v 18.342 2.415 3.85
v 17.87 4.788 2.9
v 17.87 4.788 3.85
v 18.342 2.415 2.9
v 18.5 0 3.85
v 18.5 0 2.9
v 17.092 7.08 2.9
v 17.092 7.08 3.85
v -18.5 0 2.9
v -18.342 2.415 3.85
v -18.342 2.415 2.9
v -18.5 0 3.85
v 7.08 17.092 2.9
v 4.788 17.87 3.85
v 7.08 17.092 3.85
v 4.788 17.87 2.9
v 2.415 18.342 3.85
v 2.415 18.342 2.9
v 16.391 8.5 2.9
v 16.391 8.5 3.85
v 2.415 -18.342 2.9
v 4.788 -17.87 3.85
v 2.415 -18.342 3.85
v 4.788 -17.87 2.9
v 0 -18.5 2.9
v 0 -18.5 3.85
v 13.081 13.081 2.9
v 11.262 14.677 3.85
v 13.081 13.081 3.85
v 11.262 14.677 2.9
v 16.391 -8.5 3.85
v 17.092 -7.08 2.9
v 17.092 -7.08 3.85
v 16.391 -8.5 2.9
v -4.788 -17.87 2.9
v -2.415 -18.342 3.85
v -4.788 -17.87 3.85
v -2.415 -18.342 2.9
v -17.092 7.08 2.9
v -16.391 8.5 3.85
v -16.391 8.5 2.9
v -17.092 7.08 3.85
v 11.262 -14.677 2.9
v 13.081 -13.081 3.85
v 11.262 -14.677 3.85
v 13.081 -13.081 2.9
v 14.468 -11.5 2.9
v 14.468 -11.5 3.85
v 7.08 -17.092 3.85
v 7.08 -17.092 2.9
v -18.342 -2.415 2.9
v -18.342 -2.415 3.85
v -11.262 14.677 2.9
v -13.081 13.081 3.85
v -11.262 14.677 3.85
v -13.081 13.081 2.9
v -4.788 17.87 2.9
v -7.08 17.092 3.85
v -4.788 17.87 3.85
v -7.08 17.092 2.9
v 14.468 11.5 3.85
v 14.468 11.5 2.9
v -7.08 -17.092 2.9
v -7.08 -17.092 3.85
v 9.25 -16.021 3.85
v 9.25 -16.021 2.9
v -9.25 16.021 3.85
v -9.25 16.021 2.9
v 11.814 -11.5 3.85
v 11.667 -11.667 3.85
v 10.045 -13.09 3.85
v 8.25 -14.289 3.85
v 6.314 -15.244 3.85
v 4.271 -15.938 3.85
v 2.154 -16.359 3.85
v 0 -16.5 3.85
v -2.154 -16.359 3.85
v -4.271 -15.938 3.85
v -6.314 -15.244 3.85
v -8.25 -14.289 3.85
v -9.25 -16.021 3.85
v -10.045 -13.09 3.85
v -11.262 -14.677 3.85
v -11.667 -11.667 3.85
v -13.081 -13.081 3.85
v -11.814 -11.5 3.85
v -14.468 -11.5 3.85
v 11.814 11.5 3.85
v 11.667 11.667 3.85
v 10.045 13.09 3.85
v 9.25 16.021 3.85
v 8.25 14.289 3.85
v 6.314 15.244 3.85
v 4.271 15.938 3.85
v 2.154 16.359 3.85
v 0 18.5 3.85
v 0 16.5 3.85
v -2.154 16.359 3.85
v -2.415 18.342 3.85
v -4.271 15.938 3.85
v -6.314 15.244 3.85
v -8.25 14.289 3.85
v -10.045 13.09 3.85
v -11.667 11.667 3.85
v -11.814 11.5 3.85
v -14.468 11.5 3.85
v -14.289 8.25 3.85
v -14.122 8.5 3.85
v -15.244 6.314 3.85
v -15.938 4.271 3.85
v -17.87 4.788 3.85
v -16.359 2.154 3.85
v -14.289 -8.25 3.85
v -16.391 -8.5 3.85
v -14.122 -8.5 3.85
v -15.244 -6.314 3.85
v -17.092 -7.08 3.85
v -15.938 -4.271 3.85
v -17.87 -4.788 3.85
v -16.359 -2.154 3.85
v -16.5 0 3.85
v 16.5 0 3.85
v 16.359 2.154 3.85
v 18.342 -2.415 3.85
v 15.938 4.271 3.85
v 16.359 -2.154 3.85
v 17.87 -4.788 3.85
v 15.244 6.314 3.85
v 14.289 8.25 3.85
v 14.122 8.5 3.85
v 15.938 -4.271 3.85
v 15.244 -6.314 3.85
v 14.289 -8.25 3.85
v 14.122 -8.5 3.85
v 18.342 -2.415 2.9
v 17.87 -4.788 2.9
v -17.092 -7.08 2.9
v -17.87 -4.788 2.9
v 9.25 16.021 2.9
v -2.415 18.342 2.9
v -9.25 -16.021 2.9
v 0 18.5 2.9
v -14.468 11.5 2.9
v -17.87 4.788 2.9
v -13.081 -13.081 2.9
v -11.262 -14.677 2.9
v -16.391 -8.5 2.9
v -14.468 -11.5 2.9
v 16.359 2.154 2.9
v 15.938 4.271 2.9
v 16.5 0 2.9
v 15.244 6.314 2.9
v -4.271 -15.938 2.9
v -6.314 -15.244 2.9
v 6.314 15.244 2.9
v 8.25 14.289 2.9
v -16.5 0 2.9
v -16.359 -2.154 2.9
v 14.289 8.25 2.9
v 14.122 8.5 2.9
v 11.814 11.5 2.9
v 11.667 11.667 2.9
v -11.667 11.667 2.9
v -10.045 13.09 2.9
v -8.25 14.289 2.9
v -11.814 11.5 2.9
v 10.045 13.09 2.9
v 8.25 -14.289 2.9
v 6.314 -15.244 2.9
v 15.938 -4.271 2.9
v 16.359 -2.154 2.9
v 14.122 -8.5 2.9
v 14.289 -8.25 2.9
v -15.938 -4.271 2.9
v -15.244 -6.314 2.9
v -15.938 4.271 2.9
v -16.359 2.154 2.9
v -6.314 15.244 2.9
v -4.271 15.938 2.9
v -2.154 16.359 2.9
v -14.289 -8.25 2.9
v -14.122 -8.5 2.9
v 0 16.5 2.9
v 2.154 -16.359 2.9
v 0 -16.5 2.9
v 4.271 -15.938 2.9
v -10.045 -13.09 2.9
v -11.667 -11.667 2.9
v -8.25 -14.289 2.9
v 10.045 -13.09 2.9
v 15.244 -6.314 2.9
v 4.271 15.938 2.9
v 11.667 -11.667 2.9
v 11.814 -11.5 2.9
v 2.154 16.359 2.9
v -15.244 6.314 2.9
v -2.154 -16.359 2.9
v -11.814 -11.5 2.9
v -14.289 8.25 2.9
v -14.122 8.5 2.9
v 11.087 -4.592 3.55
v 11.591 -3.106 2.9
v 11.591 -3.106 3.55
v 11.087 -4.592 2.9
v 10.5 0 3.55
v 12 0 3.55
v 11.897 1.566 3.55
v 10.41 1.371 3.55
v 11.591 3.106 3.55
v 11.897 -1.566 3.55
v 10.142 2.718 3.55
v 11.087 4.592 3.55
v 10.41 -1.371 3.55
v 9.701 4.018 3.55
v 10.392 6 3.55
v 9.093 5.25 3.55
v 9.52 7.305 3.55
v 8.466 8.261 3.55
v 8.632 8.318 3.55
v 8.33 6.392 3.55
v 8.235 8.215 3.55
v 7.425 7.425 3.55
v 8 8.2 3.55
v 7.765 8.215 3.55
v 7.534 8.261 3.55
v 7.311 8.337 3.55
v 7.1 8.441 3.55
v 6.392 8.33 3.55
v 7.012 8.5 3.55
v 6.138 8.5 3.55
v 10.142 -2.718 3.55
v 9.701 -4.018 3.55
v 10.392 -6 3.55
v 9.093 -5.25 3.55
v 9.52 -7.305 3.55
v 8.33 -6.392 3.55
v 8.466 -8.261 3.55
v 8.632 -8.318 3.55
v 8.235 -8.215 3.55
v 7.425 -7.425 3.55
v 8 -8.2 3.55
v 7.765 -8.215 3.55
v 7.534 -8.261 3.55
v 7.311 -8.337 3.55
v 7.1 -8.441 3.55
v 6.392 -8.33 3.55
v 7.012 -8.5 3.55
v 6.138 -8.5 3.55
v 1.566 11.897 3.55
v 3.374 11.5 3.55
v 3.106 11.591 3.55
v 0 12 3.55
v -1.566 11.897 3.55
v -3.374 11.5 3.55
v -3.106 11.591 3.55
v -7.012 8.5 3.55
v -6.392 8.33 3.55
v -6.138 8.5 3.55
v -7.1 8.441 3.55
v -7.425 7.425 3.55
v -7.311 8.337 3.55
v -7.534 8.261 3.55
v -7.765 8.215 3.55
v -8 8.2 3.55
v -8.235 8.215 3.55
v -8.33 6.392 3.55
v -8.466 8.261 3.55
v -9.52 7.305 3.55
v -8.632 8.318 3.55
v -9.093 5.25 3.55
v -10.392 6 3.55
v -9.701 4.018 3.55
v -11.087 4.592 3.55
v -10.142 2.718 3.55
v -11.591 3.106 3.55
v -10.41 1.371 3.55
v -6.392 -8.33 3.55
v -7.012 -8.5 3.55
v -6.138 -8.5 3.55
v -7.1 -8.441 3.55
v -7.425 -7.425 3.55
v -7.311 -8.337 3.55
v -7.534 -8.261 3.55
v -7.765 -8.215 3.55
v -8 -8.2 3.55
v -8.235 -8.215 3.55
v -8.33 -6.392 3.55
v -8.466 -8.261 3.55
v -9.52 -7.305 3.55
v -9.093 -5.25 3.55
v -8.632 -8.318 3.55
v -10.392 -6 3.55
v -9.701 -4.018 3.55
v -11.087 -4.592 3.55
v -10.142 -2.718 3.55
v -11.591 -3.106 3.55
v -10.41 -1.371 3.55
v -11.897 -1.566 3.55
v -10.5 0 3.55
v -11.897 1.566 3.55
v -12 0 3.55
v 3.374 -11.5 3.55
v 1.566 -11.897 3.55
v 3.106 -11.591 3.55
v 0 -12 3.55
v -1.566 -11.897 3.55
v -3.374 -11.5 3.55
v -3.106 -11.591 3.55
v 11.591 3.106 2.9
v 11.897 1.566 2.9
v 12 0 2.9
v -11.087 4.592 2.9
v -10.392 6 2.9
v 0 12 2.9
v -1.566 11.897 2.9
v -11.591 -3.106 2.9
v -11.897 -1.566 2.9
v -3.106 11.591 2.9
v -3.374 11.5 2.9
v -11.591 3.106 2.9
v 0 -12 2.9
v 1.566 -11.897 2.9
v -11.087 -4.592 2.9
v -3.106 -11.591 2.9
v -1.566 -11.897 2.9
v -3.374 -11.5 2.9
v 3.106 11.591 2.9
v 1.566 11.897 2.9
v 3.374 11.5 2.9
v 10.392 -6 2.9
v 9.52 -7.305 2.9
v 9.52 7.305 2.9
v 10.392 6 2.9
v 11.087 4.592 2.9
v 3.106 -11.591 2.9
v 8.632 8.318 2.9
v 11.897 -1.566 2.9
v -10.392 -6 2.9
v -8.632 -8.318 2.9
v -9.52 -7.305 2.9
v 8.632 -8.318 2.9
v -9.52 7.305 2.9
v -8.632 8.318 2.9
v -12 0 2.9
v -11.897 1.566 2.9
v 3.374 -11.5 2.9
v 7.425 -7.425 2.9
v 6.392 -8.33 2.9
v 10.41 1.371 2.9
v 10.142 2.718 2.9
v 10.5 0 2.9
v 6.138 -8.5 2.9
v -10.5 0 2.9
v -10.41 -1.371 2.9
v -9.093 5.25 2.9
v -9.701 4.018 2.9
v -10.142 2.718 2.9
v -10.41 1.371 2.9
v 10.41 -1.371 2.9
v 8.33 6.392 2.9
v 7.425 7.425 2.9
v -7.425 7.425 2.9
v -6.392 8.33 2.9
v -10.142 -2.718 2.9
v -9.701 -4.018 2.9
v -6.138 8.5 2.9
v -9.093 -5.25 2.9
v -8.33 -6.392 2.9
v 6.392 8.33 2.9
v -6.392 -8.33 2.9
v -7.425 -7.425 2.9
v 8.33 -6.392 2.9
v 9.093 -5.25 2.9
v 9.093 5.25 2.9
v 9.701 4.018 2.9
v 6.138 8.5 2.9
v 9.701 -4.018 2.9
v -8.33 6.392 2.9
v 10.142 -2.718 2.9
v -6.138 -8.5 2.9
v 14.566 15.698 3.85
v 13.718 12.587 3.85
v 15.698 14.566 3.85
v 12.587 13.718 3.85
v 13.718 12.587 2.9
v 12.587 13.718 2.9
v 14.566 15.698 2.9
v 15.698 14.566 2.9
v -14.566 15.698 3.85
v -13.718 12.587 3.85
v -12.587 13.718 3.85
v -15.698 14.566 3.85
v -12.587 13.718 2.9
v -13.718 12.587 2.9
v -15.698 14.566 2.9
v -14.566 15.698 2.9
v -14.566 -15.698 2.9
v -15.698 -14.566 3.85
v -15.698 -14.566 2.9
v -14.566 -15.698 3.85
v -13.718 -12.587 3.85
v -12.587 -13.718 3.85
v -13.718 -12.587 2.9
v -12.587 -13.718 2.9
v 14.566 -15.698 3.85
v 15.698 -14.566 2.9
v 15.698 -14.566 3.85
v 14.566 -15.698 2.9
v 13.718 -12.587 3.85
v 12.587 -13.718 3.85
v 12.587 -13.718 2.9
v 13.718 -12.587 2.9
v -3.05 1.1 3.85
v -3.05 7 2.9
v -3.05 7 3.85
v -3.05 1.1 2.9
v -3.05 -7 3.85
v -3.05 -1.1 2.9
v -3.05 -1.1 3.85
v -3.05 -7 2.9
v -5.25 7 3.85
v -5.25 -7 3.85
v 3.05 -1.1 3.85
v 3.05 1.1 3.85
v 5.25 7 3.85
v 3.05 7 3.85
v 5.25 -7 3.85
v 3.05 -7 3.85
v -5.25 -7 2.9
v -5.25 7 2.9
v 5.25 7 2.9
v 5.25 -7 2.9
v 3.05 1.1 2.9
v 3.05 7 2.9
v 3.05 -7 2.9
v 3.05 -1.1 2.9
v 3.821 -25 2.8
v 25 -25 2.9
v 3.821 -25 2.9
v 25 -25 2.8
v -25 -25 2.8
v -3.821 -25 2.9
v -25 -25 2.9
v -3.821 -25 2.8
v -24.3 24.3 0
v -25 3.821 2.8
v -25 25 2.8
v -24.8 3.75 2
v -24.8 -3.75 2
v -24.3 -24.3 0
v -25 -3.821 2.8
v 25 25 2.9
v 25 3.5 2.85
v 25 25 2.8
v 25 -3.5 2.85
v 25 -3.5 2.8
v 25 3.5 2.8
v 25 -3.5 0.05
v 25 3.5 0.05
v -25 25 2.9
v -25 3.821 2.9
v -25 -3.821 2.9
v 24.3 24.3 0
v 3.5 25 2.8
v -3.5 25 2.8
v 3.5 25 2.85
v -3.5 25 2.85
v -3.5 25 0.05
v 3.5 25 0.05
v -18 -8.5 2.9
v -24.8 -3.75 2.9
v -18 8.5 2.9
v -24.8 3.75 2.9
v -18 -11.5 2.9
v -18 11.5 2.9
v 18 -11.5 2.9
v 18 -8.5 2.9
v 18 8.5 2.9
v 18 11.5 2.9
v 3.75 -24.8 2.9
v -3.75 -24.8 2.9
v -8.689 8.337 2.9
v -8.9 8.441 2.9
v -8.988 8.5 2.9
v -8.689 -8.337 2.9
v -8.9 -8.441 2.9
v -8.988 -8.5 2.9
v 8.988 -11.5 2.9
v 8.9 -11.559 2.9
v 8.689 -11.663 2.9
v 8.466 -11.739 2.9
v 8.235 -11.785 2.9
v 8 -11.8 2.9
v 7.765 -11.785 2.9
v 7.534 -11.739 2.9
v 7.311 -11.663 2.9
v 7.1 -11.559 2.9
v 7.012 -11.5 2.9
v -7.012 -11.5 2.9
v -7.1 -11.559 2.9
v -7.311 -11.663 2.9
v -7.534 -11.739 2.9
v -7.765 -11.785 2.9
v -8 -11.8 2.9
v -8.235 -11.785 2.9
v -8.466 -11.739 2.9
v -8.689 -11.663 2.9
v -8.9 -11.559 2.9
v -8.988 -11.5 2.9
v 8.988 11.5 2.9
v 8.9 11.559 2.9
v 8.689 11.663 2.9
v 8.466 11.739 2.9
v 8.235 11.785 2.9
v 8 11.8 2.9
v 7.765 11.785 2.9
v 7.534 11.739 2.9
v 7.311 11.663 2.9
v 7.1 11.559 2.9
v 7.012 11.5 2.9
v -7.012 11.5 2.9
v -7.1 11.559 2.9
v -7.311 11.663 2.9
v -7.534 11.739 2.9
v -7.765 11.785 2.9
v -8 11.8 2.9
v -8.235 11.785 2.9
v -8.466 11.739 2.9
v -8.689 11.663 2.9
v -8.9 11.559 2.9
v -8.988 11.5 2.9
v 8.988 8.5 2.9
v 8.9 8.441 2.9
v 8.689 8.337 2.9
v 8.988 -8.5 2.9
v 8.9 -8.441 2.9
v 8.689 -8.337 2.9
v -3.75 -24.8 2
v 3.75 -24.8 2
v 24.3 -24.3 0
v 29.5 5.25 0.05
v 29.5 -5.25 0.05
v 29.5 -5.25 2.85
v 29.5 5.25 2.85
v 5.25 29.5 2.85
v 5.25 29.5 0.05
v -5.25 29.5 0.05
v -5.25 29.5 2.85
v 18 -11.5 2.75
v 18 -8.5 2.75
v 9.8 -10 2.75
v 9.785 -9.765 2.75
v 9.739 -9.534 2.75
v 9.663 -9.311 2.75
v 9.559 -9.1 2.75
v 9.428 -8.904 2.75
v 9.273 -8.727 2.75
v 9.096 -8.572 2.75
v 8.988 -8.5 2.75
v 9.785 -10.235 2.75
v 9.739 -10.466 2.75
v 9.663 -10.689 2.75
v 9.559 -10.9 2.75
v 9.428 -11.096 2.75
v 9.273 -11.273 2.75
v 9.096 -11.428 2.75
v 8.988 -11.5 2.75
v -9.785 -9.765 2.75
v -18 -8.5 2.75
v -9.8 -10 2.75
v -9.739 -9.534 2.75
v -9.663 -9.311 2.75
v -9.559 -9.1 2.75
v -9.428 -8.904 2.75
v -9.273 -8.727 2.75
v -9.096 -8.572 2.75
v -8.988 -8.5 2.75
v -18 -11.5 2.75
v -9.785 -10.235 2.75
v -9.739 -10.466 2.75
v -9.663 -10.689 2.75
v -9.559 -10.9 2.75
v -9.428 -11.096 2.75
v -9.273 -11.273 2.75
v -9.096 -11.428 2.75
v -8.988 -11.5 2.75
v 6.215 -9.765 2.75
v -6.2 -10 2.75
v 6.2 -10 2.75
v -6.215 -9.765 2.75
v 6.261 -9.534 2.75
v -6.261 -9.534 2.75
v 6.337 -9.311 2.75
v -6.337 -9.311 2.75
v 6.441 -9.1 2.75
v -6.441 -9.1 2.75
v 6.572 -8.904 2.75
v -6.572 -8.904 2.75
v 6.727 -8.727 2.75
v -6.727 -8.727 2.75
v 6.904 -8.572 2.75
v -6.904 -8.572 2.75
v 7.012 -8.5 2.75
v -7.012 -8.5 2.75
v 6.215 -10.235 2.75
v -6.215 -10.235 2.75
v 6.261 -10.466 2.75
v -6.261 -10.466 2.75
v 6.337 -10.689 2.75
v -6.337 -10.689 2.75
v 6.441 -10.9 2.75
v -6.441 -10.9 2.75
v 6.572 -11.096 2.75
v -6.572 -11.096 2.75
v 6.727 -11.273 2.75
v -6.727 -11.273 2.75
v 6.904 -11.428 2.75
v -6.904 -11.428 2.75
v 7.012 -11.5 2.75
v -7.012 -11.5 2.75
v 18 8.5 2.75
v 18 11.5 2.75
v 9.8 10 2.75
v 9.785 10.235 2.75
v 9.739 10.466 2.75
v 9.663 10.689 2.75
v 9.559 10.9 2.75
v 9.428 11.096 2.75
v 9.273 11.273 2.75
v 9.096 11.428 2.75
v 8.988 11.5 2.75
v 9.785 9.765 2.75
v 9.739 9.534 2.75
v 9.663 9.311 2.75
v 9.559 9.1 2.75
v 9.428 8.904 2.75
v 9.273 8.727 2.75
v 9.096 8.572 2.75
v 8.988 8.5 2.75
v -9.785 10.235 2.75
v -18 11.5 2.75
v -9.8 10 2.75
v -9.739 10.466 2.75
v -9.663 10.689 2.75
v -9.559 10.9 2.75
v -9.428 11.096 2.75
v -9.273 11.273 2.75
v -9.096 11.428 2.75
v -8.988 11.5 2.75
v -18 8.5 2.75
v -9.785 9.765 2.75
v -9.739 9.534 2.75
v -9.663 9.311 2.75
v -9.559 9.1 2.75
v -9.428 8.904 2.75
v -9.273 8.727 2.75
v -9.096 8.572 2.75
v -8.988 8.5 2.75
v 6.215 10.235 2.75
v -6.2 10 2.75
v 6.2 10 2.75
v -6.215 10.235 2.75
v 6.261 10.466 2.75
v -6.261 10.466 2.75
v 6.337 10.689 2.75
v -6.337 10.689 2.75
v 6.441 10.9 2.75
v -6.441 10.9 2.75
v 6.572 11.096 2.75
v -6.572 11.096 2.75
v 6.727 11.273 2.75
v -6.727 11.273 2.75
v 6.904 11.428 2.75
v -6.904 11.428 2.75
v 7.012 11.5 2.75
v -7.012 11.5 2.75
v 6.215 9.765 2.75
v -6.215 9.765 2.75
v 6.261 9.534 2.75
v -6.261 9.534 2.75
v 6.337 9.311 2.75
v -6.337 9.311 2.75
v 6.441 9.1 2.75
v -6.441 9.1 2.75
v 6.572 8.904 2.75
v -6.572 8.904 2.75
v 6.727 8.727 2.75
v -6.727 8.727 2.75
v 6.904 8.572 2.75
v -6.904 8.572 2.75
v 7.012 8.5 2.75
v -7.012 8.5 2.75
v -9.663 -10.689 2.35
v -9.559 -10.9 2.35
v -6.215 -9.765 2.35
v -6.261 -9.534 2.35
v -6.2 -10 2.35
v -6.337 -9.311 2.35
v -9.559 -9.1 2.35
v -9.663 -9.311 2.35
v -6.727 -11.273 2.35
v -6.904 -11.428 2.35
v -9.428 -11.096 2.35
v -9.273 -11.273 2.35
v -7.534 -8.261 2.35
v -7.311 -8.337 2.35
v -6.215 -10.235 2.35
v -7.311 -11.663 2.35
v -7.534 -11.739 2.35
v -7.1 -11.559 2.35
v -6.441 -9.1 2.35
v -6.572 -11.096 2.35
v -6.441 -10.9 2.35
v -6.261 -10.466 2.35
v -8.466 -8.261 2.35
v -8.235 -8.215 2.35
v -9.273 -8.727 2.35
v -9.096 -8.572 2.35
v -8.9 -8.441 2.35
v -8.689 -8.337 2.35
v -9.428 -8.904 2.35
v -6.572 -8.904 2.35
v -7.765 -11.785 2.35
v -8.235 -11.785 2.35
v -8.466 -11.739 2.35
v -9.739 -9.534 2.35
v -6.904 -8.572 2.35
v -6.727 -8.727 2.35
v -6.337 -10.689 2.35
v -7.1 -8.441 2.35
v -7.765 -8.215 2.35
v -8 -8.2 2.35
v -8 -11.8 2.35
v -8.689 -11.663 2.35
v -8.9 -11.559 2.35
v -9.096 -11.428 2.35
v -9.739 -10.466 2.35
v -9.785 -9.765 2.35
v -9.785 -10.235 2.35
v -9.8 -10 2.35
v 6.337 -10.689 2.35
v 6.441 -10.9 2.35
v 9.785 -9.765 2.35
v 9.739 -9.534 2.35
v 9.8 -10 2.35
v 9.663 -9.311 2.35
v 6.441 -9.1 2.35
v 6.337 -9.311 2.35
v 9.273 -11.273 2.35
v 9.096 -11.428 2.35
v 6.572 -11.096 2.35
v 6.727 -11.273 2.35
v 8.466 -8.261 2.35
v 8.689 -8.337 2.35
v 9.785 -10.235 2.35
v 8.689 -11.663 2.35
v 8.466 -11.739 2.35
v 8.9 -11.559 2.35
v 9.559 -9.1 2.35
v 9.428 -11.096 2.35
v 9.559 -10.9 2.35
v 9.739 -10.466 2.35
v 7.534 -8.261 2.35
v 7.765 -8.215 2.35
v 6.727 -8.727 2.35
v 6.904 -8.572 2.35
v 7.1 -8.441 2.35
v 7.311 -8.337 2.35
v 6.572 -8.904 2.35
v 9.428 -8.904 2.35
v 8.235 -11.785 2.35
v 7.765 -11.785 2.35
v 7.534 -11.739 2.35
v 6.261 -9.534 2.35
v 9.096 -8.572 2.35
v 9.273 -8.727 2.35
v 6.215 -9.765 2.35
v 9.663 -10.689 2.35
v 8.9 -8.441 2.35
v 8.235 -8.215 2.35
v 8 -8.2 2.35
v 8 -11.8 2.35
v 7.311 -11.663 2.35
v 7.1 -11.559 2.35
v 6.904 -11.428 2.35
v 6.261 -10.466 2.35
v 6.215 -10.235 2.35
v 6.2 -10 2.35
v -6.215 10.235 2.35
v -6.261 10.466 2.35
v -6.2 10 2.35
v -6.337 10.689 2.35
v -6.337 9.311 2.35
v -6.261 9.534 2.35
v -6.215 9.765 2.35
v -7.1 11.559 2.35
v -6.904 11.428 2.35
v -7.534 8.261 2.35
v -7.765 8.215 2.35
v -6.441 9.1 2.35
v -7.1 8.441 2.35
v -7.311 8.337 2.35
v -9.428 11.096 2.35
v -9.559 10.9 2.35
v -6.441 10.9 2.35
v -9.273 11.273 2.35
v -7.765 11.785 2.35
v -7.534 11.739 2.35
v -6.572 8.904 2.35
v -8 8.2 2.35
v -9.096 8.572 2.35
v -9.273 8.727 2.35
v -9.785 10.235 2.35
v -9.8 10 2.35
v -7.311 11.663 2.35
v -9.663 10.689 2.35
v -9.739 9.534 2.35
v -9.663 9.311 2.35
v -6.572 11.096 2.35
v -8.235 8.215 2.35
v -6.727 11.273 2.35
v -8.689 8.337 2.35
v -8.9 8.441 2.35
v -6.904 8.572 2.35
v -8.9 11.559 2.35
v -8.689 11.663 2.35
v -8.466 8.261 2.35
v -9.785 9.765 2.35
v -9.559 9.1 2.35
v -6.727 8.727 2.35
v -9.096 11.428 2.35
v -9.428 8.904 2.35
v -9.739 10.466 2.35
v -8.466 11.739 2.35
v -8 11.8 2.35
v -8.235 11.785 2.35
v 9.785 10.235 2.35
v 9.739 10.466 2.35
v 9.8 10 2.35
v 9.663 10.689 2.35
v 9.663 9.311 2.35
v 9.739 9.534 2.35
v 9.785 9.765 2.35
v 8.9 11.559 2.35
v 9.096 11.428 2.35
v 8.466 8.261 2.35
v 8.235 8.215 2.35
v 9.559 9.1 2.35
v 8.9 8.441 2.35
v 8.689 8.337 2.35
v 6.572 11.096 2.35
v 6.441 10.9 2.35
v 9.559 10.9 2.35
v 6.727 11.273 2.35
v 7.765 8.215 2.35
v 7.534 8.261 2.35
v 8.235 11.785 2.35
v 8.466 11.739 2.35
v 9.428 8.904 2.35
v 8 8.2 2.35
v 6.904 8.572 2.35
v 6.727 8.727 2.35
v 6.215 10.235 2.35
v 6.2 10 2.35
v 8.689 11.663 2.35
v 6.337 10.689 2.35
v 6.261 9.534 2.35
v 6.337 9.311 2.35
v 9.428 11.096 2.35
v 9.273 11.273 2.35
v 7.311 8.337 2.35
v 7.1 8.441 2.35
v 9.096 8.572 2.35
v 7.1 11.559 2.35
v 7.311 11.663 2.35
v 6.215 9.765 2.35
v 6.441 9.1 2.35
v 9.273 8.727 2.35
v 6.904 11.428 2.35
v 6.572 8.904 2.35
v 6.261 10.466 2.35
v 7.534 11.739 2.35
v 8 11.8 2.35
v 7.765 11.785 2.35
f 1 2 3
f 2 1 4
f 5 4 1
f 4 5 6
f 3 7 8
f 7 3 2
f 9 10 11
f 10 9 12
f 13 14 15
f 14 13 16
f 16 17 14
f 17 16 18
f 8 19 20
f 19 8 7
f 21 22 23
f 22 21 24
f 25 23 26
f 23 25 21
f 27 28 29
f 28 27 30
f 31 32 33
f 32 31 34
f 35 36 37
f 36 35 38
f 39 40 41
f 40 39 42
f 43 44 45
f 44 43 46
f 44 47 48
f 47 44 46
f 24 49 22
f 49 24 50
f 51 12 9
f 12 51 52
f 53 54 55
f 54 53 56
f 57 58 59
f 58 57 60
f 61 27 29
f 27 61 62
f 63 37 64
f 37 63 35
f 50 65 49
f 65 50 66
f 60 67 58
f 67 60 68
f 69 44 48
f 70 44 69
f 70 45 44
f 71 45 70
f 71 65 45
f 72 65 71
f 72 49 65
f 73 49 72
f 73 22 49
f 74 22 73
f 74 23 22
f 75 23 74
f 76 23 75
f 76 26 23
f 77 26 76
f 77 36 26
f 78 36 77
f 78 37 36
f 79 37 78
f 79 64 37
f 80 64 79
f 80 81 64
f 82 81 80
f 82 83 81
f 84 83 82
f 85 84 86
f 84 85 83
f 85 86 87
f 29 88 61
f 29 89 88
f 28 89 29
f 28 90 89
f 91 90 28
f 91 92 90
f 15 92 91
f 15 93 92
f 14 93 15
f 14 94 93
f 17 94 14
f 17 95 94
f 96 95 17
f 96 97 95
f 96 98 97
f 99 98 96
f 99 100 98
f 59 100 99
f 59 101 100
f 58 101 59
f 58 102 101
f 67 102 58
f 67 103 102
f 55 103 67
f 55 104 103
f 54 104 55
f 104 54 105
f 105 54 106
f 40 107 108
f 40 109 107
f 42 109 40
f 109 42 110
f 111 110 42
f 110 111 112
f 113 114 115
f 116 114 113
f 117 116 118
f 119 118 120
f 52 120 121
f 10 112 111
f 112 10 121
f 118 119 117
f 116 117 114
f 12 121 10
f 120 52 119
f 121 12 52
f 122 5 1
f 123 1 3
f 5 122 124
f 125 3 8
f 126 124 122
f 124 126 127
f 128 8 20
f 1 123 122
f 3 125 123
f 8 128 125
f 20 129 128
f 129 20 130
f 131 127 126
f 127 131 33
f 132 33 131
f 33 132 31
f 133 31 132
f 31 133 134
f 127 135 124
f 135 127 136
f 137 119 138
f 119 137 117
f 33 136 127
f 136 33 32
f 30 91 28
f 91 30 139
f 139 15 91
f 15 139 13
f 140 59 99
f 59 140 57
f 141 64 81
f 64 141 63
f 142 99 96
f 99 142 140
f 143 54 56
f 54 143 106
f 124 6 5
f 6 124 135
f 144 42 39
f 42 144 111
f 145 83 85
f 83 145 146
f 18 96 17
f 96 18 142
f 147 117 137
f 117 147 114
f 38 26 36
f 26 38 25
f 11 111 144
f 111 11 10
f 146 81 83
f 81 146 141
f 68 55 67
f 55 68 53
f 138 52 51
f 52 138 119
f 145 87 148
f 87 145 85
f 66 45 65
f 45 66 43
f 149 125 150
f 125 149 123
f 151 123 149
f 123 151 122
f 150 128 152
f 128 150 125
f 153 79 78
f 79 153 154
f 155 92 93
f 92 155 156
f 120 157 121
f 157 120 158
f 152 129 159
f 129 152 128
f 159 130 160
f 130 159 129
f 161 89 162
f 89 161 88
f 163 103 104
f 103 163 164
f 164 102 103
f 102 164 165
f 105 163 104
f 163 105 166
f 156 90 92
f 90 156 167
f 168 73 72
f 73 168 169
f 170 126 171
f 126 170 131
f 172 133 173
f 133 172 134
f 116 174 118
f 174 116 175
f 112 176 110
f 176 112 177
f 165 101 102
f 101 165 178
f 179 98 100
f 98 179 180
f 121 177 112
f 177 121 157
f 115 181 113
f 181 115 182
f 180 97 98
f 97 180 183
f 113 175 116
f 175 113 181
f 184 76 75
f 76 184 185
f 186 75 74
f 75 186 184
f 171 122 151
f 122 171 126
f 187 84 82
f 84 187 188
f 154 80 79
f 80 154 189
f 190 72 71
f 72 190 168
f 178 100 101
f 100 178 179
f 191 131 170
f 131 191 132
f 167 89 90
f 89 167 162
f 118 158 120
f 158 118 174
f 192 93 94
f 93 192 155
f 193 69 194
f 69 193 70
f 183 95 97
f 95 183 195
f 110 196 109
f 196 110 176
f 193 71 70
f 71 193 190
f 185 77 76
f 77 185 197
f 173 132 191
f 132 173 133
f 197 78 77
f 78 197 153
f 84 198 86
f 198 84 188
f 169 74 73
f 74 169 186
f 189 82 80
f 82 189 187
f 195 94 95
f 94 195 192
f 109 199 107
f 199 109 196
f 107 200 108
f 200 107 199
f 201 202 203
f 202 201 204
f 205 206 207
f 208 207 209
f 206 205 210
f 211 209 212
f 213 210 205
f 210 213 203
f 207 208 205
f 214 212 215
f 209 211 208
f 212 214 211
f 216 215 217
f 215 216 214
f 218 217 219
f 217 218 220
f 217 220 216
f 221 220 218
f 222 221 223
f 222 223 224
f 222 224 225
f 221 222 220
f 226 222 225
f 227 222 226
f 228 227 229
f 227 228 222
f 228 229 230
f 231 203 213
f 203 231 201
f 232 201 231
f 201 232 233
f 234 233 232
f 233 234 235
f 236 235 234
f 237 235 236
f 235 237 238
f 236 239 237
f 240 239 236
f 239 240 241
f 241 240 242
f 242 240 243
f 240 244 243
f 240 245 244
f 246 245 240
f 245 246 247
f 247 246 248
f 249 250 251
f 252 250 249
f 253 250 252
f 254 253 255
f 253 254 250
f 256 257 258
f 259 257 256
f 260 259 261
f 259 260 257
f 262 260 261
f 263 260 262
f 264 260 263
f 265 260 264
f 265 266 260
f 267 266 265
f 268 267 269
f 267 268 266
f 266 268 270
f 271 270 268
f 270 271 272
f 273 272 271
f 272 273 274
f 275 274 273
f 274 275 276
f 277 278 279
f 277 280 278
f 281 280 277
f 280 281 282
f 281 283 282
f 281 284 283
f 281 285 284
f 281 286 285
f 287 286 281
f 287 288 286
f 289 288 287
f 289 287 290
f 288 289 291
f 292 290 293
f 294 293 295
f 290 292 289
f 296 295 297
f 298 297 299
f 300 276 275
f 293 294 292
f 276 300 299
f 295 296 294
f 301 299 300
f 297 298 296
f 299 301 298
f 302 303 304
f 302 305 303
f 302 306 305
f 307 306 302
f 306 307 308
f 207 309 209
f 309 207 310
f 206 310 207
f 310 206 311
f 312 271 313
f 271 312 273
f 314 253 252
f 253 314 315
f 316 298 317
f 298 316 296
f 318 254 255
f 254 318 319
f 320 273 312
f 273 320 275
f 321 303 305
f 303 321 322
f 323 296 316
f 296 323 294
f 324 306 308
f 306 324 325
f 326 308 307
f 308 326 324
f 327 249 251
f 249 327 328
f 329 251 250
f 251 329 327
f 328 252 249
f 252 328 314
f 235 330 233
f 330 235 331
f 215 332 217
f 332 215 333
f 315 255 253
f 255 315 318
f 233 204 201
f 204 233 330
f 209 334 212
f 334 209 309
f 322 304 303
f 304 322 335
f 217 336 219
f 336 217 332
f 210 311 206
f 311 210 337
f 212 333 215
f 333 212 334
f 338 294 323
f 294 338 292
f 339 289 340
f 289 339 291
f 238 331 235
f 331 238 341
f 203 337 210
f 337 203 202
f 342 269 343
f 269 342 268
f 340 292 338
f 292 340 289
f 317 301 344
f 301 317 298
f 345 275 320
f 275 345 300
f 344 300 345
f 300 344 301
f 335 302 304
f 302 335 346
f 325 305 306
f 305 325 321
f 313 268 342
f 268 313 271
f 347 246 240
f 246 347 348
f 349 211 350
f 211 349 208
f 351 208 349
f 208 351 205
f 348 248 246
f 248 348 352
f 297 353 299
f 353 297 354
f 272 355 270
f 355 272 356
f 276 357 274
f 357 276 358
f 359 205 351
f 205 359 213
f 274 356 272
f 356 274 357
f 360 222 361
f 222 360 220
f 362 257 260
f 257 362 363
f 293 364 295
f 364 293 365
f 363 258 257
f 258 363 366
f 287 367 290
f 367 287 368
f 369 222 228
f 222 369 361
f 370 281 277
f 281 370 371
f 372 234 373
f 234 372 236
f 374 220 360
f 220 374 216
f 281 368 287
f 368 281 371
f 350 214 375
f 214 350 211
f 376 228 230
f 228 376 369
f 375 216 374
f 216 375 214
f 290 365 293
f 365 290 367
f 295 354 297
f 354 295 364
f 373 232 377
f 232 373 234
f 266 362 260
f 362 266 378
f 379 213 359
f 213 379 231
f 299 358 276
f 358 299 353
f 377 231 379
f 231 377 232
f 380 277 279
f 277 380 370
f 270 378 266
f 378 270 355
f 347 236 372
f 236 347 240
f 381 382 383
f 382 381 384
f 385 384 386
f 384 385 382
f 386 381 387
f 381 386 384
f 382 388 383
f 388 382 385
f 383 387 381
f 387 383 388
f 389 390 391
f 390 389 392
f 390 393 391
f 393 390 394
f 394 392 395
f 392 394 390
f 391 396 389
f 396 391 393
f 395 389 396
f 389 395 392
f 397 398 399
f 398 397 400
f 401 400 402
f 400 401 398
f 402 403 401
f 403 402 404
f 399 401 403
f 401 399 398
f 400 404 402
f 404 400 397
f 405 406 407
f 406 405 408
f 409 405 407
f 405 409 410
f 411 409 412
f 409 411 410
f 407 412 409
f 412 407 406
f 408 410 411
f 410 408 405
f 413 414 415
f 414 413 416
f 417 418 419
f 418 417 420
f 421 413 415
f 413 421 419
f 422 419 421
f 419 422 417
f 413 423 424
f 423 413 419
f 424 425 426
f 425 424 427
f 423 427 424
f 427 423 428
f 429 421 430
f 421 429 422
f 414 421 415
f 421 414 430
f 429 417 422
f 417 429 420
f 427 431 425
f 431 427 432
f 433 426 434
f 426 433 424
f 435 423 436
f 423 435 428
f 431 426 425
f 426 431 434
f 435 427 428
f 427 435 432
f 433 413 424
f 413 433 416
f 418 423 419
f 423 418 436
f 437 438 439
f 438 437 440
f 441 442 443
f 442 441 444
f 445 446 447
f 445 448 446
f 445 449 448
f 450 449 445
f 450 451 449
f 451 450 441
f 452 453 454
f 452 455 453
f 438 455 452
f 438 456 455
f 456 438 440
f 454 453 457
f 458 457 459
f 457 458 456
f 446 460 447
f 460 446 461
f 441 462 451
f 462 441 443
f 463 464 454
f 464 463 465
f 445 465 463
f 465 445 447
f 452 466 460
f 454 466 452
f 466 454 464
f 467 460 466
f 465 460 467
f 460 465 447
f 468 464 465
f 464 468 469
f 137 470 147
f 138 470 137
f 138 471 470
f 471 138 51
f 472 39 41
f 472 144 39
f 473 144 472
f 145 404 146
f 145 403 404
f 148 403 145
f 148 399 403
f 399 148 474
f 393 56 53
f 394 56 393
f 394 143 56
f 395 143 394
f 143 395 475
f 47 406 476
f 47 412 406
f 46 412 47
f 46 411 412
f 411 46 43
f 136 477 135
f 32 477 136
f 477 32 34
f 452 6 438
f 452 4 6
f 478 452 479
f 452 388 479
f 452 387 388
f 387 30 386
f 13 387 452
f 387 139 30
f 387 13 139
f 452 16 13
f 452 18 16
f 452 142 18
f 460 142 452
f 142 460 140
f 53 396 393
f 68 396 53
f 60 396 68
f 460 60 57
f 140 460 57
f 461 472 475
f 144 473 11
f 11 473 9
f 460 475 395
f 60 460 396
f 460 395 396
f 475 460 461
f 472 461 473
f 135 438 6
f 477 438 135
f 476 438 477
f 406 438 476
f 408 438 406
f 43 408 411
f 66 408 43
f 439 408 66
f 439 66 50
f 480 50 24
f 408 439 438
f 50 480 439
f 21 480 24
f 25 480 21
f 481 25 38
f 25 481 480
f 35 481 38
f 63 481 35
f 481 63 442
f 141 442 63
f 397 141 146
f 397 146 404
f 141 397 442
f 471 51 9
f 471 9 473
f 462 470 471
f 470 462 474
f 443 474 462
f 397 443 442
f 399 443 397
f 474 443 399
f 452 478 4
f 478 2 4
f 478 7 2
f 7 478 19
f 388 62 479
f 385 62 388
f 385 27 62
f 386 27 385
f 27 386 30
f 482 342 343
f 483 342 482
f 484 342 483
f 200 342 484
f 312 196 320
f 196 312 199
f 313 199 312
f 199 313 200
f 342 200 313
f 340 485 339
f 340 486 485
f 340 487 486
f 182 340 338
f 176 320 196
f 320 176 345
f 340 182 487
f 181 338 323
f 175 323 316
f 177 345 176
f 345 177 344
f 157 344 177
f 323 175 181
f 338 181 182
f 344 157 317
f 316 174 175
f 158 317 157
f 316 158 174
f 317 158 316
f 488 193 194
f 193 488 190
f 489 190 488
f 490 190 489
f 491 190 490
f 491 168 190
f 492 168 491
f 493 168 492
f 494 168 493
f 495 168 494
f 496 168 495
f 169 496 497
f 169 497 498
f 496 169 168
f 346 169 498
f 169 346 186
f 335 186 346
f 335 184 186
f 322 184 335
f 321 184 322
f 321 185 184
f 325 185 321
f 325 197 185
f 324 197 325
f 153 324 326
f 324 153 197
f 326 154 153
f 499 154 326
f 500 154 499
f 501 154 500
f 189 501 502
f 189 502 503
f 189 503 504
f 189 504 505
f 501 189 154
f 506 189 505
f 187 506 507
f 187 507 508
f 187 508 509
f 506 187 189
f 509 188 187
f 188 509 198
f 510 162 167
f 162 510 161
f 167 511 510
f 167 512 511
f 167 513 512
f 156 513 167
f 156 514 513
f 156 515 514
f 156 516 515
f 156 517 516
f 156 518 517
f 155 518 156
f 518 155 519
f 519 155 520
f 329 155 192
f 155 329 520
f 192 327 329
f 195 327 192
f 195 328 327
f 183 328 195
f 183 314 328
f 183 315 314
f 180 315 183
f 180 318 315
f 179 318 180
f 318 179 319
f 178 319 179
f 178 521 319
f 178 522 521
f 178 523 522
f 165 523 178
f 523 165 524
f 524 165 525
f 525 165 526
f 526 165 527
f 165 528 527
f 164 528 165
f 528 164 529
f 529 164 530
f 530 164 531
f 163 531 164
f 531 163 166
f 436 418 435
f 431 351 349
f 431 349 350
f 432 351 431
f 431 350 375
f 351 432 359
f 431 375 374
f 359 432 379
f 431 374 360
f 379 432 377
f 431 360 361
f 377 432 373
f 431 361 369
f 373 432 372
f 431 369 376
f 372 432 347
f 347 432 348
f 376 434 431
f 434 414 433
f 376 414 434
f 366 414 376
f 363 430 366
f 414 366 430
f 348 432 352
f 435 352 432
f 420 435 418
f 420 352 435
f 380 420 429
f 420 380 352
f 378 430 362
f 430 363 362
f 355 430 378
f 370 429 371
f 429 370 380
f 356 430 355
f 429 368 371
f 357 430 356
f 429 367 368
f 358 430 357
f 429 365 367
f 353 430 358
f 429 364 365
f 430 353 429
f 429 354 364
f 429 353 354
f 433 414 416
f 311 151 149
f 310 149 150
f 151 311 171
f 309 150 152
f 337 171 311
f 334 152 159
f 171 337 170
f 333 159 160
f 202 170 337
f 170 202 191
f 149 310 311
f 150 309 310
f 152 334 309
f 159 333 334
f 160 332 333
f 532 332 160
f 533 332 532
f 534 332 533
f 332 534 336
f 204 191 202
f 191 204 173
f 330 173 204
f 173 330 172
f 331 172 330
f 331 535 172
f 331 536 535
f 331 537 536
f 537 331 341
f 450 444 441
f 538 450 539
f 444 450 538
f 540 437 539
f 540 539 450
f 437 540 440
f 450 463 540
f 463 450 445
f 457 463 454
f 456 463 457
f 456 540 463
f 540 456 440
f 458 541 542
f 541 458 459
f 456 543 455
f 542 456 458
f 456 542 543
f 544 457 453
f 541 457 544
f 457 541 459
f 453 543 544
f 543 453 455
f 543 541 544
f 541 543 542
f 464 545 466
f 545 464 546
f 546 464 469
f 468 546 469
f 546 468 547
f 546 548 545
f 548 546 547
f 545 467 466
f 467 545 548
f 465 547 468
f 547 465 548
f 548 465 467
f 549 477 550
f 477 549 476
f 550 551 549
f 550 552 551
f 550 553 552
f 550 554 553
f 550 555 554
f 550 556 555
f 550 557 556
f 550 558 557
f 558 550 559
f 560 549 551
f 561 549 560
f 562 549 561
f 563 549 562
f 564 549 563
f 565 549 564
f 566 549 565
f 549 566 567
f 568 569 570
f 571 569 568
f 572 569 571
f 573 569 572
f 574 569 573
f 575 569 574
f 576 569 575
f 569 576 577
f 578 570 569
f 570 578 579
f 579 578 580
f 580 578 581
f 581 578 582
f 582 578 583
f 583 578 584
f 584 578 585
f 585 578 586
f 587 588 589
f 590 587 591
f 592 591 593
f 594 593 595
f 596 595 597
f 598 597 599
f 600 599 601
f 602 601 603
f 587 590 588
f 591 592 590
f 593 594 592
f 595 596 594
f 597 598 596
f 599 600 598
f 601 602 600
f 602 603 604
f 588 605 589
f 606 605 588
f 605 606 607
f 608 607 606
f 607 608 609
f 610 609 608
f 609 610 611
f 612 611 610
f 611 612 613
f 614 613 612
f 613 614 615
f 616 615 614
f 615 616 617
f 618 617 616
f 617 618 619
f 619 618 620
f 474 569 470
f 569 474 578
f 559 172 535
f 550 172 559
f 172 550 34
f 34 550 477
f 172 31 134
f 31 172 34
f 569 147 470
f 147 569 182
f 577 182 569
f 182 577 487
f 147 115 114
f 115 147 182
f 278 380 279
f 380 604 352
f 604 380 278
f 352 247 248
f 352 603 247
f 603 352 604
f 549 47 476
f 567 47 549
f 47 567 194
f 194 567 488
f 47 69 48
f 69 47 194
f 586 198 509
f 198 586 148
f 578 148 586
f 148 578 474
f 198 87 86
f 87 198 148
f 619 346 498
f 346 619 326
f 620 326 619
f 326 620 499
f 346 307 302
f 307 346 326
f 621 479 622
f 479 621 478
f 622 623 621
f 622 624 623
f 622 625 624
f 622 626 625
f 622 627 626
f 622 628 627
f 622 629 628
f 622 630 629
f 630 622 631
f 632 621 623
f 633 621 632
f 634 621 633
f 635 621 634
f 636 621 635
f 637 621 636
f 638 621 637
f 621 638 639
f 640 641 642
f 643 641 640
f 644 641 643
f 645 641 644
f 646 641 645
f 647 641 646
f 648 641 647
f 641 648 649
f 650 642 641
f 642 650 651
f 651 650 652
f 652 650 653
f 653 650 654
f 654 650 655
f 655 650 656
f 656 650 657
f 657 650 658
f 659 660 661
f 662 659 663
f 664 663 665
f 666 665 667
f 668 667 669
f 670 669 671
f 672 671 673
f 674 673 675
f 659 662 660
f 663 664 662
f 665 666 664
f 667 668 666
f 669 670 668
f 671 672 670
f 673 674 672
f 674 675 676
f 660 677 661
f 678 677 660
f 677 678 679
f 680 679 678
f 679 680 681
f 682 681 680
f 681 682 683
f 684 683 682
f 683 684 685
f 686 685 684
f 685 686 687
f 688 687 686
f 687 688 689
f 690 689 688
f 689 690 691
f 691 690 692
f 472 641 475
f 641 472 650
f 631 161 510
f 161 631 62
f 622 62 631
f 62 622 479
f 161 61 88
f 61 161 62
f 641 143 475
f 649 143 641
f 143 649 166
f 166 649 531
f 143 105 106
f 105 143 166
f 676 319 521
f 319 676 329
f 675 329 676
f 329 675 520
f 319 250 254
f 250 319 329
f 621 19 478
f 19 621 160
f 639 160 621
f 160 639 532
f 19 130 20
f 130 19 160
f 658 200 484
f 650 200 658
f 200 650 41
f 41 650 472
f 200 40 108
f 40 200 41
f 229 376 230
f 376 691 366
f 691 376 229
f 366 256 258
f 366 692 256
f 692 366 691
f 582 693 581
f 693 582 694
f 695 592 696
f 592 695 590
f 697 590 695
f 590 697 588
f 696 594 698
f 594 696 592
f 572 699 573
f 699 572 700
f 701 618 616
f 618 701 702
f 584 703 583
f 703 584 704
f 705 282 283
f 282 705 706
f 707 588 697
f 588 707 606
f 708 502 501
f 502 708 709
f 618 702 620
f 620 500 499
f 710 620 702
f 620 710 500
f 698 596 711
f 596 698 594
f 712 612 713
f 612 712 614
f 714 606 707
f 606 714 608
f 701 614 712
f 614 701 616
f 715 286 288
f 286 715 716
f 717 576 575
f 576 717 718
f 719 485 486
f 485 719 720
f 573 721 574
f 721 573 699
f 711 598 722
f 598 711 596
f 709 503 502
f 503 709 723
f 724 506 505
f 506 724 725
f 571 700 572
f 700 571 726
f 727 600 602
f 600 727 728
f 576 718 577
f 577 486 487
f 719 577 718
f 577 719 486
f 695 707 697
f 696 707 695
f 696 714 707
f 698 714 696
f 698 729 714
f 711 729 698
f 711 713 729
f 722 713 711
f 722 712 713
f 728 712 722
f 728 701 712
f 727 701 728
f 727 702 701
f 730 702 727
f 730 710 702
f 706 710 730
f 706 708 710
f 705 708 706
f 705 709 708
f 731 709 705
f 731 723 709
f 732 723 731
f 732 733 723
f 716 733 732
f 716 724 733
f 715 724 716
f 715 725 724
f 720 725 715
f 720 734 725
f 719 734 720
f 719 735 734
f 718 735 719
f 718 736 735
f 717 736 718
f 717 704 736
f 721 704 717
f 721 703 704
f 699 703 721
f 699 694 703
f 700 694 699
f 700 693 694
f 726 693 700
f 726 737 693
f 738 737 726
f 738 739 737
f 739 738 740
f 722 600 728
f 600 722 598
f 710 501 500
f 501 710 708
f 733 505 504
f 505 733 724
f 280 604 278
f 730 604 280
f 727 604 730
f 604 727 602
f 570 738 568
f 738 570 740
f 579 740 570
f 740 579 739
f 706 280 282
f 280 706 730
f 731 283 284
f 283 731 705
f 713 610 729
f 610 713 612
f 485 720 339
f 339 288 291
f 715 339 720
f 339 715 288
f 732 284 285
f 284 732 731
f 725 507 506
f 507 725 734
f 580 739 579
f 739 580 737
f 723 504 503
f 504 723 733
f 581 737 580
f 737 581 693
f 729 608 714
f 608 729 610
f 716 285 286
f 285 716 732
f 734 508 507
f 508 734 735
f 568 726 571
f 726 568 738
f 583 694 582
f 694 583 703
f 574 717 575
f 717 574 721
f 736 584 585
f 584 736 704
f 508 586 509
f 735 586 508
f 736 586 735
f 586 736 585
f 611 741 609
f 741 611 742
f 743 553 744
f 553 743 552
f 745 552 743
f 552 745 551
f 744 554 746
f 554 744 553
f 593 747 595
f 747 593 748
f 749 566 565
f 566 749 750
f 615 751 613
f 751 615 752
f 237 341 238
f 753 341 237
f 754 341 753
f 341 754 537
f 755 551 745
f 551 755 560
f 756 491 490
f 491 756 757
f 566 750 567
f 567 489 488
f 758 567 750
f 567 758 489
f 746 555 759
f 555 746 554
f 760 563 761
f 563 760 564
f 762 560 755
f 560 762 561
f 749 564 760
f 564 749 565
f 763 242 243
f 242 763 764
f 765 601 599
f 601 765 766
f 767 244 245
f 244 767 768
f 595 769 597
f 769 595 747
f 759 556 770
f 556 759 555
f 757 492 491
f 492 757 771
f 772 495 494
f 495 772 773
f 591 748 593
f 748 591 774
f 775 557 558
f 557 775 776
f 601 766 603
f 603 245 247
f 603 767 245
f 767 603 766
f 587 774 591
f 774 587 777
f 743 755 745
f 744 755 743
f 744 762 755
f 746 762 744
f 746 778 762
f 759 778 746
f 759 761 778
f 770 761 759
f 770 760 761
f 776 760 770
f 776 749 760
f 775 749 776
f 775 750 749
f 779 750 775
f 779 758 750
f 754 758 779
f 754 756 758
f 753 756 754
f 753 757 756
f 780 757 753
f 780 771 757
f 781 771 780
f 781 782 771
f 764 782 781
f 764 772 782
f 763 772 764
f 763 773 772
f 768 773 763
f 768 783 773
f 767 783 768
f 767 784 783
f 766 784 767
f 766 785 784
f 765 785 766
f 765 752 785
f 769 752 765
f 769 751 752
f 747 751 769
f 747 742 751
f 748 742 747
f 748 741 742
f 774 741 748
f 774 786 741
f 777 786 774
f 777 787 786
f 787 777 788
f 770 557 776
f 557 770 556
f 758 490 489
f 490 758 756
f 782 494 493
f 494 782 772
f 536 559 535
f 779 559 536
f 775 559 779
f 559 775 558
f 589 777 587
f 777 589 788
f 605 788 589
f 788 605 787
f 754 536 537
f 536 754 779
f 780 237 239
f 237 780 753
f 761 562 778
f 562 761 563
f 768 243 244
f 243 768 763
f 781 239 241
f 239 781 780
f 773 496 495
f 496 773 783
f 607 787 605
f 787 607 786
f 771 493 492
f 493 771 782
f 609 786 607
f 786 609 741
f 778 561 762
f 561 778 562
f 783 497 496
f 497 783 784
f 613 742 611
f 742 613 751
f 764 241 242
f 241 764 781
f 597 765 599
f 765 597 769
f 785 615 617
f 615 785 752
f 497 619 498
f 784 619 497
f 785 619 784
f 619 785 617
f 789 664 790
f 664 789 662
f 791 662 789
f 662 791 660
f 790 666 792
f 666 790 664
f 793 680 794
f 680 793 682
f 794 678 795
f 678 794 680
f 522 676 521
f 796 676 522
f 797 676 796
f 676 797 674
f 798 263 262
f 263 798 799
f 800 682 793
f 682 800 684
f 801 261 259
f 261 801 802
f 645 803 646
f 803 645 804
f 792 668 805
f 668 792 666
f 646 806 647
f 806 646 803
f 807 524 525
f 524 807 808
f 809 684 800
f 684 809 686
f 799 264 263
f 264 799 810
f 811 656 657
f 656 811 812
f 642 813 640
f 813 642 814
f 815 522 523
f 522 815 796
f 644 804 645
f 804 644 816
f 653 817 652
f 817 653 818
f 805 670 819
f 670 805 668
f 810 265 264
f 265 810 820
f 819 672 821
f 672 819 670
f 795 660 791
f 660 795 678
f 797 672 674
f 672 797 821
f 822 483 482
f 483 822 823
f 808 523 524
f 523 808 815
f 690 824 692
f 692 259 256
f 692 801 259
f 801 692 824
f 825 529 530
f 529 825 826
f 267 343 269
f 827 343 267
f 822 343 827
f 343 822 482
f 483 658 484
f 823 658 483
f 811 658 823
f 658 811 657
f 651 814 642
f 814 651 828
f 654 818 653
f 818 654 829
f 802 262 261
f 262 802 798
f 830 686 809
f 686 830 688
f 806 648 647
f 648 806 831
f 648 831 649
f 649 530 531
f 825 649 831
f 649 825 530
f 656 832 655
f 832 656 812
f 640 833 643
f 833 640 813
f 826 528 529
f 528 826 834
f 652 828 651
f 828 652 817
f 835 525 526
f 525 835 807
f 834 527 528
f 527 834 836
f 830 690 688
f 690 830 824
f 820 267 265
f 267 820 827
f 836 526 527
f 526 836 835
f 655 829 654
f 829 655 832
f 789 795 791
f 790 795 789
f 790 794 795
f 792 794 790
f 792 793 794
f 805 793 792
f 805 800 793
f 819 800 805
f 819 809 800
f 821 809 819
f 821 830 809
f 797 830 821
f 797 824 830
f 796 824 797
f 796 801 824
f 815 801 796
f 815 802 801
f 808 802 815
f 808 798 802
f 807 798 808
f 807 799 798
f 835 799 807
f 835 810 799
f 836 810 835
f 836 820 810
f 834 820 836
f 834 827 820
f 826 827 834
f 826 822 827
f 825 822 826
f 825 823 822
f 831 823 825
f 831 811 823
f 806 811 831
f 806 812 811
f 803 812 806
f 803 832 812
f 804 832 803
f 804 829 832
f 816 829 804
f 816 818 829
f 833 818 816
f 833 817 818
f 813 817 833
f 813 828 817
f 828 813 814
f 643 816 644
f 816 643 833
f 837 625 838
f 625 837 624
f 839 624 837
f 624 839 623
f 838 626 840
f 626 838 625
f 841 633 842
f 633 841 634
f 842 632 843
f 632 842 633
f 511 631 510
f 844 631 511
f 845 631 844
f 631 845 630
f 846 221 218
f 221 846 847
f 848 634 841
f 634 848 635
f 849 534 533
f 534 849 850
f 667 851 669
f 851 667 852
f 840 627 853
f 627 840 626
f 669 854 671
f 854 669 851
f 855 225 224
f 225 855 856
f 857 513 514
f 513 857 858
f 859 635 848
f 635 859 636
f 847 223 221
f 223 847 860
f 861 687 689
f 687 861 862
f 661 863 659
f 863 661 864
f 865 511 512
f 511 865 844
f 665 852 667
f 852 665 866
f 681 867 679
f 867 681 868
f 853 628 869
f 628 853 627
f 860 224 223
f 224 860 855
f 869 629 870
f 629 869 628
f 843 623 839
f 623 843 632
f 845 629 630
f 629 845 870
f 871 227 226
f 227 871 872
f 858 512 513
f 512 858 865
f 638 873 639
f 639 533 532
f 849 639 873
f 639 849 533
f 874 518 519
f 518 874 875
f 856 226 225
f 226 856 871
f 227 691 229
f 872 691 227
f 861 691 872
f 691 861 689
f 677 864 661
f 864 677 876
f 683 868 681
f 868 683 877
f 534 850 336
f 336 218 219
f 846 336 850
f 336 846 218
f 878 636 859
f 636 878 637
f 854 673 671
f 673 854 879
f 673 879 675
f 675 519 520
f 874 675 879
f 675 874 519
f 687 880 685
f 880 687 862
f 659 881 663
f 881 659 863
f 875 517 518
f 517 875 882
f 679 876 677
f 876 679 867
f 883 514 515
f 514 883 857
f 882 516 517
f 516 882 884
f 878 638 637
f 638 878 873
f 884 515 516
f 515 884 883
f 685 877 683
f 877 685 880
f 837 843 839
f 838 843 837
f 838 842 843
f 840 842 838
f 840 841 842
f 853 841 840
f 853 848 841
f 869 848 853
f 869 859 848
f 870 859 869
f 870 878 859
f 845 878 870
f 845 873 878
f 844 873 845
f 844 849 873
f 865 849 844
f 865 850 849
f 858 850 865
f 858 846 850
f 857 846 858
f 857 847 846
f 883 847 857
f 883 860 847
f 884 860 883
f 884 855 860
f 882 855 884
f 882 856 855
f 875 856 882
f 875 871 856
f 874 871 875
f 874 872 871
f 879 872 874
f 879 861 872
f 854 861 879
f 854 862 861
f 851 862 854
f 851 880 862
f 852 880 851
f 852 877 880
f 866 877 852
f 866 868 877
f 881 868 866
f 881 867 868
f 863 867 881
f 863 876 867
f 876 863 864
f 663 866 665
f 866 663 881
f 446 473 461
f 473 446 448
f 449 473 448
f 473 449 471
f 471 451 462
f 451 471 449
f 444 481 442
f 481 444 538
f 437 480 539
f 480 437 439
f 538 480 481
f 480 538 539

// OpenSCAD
// file: 05_modular_35mm_helipad_base.scad
// ====================================================================
// Modular Helipad Base - 5.0 cm (50mm) Square Interlocking Tile
// Dimensions: 50.0 mm x 50.0 mm x 3.8 mm
// Standard tile footprint designed for 5.0 cm Modular Chopper.
//
// Features:
// - Standard 50mm (5.0 cm) modular grid footprint
// - Male / Female dovetail connectors on orthogonal sides (0.25mm clearance)
// - Precision skid landing alignment slots (20.0mm track for 5cm chopper skids)
// - Helipad 'H' and concentric marking rings
// - 45-degree chamfered perimeter to prevent corner warping
// ====================================================================

$fn = 48;

tile_size = 50.0;
base_h    = 2.8;
relief_h  = 1.0;
total_h   = base_h + relief_h;
skid_span = 20.0; // Distance between skid centers (matches 5cm chopper)

// Dovetail parameters
dt_w_base = 7.0;
dt_w_tip  = 10.5;
dt_depth  = 4.5;
dt_tol    = 0.25; // Radial tolerance for snap fit

module dovetail_male() {
    linear_extrude(height = base_h)
        polygon([
            [-dt_w_base/2, 0],
            [ dt_w_base/2, 0],
            [ dt_w_tip/2,  dt_depth],
            [-dt_w_tip/2,  dt_depth]
        ]);
}

module dovetail_female() {
    w_b = dt_w_base/2 + dt_tol;
    w_t = dt_w_tip/2 + dt_tol;
    d   = dt_depth + dt_tol;
    translate([0, 0, -0.1])
        linear_extrude(height = base_h + 0.2)
            polygon([
                [-w_b, -0.2],
                [ w_b, -0.2],
                [ w_t,  d],
                [-w_t,  d]
            ]);
}

module helipad_markings() {
    // Concentric outer ring
    difference() {
        cylinder(r = 18.5, h = relief_h, center = false);
        translate([0, 0, -0.1])
            cylinder(r = 16.5, h = relief_h + 0.2, center = false);
    }

    // Inner dashed accent ring
    difference() {
        cylinder(r = 12.0, h = relief_h * 0.7, center = false);
        translate([0, 0, -0.1])
            cylinder(r = 10.5, h = relief_h + 0.2, center = false);
    }

    // Classic Helipad 'H' symbol
    h_h = 14.0;
    h_w = 10.5;
    h_t = 2.2;
    // Left vertical bar
    translate([-h_w/2 + h_t/2, 0, relief_h/2])
        cube([h_t, h_h, relief_h], center = true);
    // Right vertical bar
    translate([h_w/2 - h_t/2, 0, relief_h/2])
        cube([h_t, h_h, relief_h], center = true);
    // Center horizontal crossbar
    translate([0, 0, relief_h/2])
        cube([h_w, h_t, relief_h], center = true);

    // Corner alignment chevrons
    for (a = [45, 135, 225, 315]) {
        rotate([0, 0, a]) translate([20.0, 0, relief_h/2])
            cube([2.8, 1.6, relief_h], center = true);
    }
}

module helipad_tile() {
    difference() {
        union() {
            // Main chamfered tile body
            hull() {
                // Flat bottom contact at Z = 0 (48mm x 48mm with 1mm corner chamfers)
                translate([0, 0, 0])
                    cube([tile_size - 1.4, tile_size - 1.4, 0.1], center = true);
                // Beveled top deck at Z = base_h (50mm x 50mm)
                translate([0, 0, base_h])
                    cube([tile_size, tile_size, 0.1], center = true);
            }

            // Male dovetails (+X and +Y)
            translate([tile_size/2, 0, 0])
                rotate([0, 0, -90]) dovetail_male();
            translate([0, tile_size/2, 0])
                dovetail_male();

            // Raised markings
            translate([0, 0, base_h])
                helipad_markings();
        }

        // Female dovetails (-X and -Y)
        translate([-tile_size/2, 0, 0])
            rotate([0, 0, 90]) dovetail_female();
        translate([0, -tile_size/2, 0])
            rotate([0, 0, 180]) dovetail_female();

        // Skid landing guide grooves (aligned along X axis, spaced at skid_span)
        for (sy = [-1, 1]) {
            translate([0, sy * skid_span/2, base_h + relief_h - 0.5])
                cube([36.0, 3.0, 1.2], center = true);
        }

        // Skid center detent dimples
        for (sy = [-1, 1], sx = [-8.0, 8.0]) {
            translate([sx, sy * skid_span/2, base_h + relief_h - 0.9])
                cylinder(r = 1.8, h = 1.2, center = true);
        }
    }
}

// Standalone render grounded at Z = 0
translate([0, 0, 0.05])
    helipad_tile();
// main file
// ====================================================================
// Modular 50mm Helipad Base (5.0 cm Standard)
// Includes master tile definition from 05_modular_35mm_helipad_base.scad
// ====================================================================

include <05_modular_35mm_helipad_base.scad>
